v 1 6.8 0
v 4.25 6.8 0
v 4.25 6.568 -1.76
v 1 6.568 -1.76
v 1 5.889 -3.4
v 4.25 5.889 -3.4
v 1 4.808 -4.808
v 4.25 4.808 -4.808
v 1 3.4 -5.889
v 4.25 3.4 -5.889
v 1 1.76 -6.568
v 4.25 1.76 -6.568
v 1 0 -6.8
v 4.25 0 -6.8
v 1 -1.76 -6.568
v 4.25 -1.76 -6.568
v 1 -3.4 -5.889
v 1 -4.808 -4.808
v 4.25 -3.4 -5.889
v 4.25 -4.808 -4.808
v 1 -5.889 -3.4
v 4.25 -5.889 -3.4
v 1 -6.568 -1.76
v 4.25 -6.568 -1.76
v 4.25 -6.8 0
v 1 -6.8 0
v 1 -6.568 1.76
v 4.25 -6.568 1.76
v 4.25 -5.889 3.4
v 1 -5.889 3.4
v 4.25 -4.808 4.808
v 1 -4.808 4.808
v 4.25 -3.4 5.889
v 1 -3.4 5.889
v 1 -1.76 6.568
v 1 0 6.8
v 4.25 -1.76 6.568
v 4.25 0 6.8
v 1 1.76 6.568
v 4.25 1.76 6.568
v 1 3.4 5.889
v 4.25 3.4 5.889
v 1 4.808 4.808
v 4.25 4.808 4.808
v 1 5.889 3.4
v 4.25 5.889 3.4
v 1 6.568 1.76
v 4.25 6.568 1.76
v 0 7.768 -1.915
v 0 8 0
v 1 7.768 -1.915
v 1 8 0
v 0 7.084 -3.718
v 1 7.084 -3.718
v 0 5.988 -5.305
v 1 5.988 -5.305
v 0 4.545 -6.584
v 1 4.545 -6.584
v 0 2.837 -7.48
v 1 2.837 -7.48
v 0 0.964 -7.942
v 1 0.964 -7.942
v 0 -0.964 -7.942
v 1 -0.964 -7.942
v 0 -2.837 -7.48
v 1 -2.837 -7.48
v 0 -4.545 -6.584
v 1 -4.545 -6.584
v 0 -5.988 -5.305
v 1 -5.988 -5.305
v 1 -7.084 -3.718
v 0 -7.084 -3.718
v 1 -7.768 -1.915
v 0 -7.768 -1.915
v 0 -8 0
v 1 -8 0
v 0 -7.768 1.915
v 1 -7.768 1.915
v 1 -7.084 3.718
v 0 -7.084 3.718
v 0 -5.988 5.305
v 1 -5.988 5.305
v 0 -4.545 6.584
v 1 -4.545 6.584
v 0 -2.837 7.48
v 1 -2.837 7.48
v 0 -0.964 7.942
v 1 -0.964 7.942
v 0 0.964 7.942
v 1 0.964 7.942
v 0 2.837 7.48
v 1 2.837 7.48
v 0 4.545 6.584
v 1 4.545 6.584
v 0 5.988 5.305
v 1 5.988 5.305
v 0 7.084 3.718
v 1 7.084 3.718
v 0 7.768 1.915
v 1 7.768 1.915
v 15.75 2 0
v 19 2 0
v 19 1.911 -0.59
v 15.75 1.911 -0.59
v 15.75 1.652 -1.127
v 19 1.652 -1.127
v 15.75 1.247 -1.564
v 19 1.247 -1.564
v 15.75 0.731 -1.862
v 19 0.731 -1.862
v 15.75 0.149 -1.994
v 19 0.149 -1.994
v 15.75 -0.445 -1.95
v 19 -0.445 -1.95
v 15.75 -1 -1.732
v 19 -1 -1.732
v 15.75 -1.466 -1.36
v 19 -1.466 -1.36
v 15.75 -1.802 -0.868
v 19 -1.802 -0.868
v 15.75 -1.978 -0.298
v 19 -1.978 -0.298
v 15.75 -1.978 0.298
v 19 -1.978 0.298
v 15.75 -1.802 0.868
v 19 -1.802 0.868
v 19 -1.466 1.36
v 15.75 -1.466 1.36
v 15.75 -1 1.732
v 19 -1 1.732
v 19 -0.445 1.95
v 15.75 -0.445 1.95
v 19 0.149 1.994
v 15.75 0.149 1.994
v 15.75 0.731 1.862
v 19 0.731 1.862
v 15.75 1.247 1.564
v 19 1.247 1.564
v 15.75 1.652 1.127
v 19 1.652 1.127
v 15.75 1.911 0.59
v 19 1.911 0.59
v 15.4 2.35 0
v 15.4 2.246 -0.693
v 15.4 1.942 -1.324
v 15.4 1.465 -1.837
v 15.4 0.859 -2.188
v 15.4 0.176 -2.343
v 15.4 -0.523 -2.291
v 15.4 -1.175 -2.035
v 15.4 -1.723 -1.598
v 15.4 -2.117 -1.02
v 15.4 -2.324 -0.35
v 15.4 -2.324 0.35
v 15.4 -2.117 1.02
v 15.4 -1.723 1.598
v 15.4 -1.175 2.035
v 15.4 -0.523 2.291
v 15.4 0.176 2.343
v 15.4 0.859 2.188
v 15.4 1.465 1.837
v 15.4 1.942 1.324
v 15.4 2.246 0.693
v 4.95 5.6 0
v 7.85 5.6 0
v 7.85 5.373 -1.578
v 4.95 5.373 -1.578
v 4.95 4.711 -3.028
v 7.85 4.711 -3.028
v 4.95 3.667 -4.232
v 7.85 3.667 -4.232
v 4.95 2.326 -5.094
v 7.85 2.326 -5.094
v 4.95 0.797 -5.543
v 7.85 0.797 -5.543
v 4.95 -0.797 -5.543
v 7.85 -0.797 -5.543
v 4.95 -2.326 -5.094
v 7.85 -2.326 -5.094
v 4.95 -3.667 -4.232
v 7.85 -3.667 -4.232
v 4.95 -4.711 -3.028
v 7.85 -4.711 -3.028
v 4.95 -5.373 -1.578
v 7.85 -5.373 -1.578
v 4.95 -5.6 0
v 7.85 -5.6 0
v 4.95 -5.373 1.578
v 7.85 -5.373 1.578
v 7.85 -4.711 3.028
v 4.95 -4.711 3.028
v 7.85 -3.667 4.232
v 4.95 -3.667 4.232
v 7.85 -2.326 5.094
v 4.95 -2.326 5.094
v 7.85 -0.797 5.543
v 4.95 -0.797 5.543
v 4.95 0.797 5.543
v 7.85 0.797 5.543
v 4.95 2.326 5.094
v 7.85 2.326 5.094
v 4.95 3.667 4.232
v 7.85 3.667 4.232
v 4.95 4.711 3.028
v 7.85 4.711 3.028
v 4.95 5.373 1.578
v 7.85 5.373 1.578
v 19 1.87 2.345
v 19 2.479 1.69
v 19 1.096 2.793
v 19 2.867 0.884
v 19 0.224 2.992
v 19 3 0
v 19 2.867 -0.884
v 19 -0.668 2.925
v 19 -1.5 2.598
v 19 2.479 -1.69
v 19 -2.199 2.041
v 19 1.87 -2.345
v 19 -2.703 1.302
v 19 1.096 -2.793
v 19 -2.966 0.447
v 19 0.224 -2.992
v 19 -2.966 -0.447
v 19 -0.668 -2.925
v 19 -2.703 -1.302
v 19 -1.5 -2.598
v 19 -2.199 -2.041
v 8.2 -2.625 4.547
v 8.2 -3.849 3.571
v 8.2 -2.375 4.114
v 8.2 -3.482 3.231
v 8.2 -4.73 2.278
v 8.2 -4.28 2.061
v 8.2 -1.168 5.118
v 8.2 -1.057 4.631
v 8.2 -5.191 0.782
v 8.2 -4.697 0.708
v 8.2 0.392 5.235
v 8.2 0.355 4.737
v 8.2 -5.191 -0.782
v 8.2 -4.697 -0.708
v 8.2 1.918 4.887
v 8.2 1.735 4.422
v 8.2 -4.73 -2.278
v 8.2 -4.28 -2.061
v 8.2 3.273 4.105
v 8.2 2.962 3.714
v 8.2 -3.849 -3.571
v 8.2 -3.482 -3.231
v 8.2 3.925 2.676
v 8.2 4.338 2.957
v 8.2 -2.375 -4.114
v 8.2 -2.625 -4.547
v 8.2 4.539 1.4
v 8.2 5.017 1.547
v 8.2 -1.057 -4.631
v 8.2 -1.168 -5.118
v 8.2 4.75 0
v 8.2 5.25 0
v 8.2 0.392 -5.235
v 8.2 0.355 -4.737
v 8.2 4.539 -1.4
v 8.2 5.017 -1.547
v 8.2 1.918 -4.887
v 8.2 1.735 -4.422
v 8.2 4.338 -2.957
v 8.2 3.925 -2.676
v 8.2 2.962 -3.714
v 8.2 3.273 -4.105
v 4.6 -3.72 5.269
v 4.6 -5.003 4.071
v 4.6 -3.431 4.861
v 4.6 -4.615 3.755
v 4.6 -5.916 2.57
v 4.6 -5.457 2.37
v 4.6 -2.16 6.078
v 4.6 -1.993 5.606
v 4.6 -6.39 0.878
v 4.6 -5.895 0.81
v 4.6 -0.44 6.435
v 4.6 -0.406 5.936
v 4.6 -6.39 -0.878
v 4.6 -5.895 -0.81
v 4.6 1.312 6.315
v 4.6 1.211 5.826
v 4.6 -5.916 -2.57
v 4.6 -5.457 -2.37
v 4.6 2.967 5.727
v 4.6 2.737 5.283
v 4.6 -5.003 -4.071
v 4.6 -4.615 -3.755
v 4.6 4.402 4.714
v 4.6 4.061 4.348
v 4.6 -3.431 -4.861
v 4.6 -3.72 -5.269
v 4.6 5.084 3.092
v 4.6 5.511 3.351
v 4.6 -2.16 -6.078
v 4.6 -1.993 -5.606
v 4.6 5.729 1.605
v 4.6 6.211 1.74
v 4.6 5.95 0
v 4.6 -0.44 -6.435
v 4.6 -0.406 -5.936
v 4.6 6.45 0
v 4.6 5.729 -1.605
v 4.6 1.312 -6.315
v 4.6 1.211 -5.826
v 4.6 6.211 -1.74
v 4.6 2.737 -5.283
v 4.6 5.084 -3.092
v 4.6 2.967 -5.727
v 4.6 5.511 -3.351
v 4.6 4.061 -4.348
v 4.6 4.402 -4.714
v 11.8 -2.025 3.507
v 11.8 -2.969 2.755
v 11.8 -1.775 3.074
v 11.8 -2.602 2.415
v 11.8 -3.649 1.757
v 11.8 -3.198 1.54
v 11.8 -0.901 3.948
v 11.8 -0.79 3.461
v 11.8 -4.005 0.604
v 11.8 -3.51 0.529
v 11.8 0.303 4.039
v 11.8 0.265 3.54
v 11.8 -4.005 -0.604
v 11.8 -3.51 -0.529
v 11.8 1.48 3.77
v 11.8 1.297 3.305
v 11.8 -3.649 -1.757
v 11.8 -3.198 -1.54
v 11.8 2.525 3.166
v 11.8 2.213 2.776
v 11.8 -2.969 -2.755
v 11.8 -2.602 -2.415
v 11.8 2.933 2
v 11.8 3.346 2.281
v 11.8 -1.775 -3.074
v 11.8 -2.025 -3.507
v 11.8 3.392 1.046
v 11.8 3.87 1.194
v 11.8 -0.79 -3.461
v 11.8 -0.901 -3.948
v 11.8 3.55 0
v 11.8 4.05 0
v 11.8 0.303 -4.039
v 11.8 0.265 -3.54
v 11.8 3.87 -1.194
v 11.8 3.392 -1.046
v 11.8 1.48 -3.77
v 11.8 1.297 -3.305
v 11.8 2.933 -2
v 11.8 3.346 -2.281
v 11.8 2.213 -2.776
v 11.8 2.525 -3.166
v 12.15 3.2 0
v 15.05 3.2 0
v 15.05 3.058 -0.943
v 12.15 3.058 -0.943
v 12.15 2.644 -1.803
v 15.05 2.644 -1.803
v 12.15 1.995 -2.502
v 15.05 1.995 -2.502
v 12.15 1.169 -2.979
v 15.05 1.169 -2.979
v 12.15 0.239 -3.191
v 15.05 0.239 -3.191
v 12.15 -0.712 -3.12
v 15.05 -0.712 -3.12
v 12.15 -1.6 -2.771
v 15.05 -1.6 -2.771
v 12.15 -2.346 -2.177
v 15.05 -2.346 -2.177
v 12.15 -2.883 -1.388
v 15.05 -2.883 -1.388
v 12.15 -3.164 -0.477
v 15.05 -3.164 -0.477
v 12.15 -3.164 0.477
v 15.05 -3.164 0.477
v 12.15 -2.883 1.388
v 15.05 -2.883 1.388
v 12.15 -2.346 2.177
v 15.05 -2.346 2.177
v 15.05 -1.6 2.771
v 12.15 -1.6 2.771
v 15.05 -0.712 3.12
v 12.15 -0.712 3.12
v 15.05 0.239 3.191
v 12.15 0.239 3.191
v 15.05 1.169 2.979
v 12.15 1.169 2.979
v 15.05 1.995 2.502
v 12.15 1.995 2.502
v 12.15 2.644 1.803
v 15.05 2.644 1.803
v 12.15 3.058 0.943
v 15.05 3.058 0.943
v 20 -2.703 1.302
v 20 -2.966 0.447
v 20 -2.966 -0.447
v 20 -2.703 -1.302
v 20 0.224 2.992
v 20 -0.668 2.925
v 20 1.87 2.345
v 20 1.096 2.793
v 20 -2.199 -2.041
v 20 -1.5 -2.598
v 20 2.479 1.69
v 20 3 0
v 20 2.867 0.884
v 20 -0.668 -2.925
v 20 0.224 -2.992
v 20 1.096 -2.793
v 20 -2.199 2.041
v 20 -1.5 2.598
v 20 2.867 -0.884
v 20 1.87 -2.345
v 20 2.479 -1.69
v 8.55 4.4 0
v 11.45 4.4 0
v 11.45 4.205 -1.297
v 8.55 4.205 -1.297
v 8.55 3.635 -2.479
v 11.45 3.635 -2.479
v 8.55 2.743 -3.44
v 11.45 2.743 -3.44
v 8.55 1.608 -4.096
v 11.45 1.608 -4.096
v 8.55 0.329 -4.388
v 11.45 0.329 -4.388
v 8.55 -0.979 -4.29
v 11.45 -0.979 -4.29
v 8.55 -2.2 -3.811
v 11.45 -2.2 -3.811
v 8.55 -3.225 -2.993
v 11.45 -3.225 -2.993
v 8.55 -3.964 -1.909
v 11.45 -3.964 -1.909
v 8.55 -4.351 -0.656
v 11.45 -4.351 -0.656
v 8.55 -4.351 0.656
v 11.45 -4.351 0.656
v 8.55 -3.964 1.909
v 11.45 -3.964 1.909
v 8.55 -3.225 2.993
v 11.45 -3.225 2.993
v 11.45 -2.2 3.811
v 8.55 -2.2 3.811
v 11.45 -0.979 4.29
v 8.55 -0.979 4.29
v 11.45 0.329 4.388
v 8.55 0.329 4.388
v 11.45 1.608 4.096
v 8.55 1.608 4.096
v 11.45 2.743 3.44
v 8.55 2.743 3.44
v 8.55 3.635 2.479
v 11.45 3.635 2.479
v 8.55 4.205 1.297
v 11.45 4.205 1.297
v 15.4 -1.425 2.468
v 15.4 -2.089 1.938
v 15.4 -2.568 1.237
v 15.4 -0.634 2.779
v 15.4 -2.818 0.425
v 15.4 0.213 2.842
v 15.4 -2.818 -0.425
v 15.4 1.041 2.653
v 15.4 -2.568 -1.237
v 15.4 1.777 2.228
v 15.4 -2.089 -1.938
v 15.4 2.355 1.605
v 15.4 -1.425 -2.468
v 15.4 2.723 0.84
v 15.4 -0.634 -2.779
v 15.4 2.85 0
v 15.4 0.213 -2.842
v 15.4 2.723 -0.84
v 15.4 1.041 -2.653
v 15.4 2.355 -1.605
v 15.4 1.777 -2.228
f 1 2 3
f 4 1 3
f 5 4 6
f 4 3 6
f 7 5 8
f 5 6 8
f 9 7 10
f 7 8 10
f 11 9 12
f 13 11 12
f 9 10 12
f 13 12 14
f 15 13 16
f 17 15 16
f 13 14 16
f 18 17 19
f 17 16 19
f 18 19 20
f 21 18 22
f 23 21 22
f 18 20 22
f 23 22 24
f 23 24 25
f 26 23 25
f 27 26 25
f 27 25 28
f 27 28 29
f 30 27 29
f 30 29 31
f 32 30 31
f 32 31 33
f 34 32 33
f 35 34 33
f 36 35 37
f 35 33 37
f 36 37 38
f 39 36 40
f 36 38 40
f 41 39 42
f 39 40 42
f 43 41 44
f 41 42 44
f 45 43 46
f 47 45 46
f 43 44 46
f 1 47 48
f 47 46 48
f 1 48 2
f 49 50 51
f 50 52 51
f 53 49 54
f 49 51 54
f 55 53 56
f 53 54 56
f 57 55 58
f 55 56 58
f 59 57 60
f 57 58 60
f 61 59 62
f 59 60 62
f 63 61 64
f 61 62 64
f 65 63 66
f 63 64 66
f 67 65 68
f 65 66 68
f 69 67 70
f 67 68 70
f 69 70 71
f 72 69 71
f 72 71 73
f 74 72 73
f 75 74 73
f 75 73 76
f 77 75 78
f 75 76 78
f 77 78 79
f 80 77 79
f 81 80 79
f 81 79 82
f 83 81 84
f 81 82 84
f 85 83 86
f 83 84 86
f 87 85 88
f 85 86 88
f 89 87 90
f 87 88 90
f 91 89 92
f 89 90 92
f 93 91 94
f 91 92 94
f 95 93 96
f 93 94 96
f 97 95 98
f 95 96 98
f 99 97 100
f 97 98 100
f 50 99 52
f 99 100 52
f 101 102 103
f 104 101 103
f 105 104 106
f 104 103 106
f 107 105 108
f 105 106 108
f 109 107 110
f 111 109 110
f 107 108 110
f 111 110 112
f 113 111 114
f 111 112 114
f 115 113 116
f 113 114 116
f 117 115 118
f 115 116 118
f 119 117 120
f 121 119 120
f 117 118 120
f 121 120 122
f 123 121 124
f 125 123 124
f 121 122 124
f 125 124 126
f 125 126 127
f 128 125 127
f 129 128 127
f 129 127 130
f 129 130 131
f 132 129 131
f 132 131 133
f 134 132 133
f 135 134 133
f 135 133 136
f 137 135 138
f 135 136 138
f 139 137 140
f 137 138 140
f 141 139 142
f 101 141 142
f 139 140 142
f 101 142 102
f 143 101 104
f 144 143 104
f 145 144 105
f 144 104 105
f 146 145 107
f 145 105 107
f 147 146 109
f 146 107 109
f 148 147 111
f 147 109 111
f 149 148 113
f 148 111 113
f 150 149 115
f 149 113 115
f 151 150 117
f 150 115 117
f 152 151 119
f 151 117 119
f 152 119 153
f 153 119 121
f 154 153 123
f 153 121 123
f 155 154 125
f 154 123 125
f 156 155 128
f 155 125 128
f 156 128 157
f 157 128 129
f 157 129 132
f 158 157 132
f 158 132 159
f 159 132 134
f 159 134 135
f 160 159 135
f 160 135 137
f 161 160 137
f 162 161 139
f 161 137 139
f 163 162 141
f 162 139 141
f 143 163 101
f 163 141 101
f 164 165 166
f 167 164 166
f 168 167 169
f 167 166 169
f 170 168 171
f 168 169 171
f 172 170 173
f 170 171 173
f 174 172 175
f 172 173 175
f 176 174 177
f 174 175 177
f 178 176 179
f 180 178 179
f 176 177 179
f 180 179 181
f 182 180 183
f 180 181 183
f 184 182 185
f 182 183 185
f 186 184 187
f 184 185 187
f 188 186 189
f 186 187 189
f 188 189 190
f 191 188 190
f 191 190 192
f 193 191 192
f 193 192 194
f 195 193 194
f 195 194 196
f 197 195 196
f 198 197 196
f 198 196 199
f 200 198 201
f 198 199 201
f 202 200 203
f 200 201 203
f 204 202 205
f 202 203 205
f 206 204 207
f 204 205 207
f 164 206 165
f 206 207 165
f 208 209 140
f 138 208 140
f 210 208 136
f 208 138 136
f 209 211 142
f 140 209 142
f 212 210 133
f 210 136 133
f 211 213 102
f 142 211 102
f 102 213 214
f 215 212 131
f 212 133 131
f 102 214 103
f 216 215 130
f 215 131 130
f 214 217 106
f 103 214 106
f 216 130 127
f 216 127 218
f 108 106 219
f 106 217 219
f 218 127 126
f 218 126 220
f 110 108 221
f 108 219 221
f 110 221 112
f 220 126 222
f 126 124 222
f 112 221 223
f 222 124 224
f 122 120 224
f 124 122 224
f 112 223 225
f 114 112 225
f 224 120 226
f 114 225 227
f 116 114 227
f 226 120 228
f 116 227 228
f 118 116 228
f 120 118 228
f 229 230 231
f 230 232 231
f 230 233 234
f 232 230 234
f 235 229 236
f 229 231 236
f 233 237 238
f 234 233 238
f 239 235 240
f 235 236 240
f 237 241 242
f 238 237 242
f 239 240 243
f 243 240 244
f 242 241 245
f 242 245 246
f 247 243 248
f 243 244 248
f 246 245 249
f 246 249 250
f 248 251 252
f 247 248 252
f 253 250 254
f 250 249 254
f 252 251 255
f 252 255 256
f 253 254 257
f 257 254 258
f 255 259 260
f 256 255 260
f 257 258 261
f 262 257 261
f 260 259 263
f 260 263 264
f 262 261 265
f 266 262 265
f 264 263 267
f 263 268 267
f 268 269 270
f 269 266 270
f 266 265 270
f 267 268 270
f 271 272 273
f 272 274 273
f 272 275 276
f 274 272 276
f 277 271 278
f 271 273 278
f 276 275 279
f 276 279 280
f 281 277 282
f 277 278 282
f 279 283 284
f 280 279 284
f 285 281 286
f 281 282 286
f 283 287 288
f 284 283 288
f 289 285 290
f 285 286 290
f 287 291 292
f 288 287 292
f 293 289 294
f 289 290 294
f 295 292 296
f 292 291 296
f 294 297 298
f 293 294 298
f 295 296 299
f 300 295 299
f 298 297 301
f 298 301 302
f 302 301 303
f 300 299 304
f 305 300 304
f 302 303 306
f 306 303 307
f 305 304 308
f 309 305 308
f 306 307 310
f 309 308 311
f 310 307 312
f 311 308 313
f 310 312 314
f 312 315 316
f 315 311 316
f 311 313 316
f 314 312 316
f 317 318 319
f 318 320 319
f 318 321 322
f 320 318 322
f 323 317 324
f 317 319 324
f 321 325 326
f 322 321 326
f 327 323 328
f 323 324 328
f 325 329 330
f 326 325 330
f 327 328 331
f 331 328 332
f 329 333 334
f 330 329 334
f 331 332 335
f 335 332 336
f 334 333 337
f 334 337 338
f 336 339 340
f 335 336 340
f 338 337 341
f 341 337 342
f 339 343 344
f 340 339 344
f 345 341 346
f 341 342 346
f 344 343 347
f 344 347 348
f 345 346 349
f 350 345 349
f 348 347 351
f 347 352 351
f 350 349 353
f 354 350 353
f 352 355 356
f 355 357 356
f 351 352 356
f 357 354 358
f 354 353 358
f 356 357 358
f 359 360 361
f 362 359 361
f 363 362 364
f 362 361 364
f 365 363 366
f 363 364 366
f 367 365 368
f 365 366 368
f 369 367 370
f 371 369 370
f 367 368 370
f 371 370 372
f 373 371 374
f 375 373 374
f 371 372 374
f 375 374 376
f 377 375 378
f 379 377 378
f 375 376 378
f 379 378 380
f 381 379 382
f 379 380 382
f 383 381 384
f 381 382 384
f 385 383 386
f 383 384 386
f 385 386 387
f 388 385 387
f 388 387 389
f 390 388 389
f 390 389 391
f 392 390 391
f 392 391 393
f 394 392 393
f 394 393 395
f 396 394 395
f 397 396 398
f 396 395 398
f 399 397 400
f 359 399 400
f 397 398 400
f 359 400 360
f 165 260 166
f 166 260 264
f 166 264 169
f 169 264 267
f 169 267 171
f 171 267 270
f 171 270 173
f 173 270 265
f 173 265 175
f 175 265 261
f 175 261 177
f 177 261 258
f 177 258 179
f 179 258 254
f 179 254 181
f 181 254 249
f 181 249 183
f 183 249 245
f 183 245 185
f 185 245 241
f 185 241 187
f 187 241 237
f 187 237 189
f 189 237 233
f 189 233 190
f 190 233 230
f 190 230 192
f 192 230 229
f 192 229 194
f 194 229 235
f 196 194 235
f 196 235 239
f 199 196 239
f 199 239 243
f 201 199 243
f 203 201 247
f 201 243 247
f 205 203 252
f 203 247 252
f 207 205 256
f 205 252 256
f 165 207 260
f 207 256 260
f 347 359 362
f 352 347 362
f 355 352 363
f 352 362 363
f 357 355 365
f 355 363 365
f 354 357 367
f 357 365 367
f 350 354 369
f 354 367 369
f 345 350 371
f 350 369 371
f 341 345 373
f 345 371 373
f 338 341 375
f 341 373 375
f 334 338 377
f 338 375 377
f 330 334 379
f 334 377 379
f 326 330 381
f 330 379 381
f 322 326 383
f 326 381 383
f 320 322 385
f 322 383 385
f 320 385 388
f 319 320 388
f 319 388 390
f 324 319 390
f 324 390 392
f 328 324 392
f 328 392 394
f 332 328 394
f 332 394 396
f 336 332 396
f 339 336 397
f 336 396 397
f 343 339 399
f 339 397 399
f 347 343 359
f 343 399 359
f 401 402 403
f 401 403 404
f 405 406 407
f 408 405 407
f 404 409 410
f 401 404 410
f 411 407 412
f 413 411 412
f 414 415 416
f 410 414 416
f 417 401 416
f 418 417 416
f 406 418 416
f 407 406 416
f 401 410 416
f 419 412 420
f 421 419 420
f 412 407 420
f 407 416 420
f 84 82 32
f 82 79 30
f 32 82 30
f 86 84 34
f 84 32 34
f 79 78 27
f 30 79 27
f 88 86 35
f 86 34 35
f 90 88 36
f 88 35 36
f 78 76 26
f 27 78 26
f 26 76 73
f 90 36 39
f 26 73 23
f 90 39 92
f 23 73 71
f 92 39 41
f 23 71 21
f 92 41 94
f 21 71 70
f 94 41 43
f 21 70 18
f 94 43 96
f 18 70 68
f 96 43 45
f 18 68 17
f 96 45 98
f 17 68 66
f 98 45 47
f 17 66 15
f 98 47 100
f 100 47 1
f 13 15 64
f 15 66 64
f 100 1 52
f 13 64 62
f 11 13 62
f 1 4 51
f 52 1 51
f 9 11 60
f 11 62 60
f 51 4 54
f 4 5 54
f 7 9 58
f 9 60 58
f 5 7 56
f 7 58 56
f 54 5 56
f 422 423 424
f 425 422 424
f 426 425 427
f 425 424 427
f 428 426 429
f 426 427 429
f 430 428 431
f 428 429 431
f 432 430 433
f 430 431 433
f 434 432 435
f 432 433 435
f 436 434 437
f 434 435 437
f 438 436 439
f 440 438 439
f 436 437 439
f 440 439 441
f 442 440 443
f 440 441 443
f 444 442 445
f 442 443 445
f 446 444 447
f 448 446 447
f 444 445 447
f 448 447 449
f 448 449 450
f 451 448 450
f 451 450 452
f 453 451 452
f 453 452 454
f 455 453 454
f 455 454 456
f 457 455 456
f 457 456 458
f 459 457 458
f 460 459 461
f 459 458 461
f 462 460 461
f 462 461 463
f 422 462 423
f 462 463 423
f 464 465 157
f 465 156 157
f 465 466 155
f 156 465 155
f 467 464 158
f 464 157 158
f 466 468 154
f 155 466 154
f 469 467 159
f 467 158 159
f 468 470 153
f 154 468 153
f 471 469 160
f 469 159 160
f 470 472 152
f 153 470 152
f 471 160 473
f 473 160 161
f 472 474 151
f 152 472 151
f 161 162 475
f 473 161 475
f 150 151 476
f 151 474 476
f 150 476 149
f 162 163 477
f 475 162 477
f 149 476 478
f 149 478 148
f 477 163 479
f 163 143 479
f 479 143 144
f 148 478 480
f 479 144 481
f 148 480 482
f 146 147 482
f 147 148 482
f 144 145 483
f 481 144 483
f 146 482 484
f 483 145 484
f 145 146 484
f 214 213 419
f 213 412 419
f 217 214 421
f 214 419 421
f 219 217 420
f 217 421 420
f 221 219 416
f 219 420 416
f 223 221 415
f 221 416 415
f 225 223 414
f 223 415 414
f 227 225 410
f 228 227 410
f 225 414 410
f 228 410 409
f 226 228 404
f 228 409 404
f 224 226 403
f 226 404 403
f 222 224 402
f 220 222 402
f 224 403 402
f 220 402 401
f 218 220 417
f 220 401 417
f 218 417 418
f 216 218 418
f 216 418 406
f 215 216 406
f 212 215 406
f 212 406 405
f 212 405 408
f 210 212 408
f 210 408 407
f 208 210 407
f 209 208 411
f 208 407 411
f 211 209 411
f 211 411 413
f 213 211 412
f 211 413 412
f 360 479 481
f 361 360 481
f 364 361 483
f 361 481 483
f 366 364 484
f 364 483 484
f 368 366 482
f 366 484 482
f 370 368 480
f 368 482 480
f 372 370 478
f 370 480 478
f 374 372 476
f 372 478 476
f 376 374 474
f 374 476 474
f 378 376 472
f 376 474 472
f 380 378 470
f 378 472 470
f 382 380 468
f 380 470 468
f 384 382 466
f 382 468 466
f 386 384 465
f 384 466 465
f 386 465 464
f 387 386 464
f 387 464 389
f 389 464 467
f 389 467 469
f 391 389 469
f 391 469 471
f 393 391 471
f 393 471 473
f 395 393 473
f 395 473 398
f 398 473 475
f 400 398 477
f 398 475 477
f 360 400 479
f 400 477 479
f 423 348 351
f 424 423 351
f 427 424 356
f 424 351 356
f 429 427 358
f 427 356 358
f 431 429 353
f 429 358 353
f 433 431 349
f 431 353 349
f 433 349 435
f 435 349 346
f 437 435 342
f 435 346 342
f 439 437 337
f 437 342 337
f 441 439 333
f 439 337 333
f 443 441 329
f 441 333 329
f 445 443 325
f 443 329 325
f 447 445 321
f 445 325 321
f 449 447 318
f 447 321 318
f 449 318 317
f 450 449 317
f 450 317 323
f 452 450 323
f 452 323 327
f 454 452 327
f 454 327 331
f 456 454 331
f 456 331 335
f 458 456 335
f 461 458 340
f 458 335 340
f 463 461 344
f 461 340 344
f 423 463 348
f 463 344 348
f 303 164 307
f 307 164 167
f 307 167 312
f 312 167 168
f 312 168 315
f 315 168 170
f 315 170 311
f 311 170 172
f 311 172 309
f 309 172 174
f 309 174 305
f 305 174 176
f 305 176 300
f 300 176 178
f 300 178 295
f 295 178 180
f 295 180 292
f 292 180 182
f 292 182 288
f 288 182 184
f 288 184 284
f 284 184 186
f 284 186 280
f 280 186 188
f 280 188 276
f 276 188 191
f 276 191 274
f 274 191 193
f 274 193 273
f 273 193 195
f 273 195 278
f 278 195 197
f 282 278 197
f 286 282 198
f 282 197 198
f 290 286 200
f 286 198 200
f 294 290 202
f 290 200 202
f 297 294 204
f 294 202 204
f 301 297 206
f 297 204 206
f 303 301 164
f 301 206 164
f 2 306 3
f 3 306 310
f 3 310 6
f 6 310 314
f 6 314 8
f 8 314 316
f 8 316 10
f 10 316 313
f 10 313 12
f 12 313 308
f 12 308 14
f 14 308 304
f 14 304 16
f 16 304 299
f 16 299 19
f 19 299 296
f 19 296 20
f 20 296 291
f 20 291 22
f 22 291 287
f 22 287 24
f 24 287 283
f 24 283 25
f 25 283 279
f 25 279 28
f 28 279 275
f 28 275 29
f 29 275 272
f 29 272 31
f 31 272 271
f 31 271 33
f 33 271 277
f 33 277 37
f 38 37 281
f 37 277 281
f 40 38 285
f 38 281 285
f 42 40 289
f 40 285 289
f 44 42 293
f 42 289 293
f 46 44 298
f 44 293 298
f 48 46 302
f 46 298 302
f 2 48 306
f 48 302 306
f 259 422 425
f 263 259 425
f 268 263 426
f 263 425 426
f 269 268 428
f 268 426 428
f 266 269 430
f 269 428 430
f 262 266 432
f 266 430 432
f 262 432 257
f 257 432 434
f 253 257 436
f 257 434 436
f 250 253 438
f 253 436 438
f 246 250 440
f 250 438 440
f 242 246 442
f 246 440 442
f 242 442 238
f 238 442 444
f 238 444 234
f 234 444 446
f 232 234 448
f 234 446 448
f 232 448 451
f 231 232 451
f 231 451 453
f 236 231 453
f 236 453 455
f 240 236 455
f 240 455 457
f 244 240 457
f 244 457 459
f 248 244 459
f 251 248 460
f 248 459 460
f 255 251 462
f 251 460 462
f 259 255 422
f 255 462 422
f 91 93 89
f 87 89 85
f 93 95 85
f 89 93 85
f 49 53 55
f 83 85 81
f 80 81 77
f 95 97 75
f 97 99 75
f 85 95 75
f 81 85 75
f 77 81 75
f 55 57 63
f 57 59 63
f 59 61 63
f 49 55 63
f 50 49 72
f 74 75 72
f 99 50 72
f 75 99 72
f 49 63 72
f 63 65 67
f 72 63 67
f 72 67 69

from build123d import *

# Parameters (mm, degrees)
CHAMFER1_SIZE = 0.35


with BuildPart() as part:
    # Sketch1 → Revolve1 (revolve)
    with BuildSketch(Plane.XY):
        Polygon((0, 0), (0, 8), (1, 8), (1, 6.8), (4.6, 6.8), (4.6, 5.6), (8.2, 5.6), (8.2, 4.4), (11.8, 4.4), (11.8, 3.2), (15.4, 3.2), (15.4, 2), (19, 2), (19, 3), (20, 3), (20, 0), align=None)
    revolve(axis=Axis((20, 0, 0), (-1, 0, 0)))

    # Chamfer1
    chamfer1_edges = [part.edges().sort_by_distance(p)[0] for p in [
        (15.4, -2, 0),
        (15.4, -3.2, 0),
        (11.8, -3.2, 0),
        (11.8, -4.4, 0),
        (8.2, -4.4, 0),
        (8.2, -5.6, 0),
        (4.6, -5.6, 0),
        (4.6, -6.8, 0),
    ]]
    chamfer(chamfer1_edges, length=CHAMFER1_SIZE)


solid = part.part
